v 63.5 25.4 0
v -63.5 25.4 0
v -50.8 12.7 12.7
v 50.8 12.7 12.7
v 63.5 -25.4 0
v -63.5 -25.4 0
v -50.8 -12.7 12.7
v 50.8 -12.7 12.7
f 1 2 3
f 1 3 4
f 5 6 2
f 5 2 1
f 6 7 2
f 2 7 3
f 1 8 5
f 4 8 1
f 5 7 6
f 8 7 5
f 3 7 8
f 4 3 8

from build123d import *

# Parameters (mm, degrees)
F0_W     = 127
F0_H     = 12.7
F1_DEPTH = 25.4
F2_SIZE2 = 12.69999
F2_SIZE  = 12.69999


# Not quite as in the source:
# - a fillet or chamfer is up to 0.001 mm smaller than in the source, because OpenCascade refuses the exact size


with BuildPart() as f1:
    # F0 (on Front) → F1 (new body, symmetric)
    with BuildSketch(Plane.XZ):
        with Locations((0, 6.35)):
            Rectangle(F0_W, F0_H)
    extrude(amount=F1_DEPTH, both=True)

    # F2 (size 12.7 and 12.7 in the source; OpenCascade refuses exactly that, so slightly less here)
    f2_edges = [f1.edges().sort_by_distance(p)[0] for p in [
        (63.5, 0, 12.7),
        (0, 25.4, 12.7),
        (-63.5, 0, 12.7),
        (0, -25.4, 12.7),
    ]]
    chamfer(f2_edges, length=F2_SIZE, length2=F2_SIZE2)


solid = f1.part
